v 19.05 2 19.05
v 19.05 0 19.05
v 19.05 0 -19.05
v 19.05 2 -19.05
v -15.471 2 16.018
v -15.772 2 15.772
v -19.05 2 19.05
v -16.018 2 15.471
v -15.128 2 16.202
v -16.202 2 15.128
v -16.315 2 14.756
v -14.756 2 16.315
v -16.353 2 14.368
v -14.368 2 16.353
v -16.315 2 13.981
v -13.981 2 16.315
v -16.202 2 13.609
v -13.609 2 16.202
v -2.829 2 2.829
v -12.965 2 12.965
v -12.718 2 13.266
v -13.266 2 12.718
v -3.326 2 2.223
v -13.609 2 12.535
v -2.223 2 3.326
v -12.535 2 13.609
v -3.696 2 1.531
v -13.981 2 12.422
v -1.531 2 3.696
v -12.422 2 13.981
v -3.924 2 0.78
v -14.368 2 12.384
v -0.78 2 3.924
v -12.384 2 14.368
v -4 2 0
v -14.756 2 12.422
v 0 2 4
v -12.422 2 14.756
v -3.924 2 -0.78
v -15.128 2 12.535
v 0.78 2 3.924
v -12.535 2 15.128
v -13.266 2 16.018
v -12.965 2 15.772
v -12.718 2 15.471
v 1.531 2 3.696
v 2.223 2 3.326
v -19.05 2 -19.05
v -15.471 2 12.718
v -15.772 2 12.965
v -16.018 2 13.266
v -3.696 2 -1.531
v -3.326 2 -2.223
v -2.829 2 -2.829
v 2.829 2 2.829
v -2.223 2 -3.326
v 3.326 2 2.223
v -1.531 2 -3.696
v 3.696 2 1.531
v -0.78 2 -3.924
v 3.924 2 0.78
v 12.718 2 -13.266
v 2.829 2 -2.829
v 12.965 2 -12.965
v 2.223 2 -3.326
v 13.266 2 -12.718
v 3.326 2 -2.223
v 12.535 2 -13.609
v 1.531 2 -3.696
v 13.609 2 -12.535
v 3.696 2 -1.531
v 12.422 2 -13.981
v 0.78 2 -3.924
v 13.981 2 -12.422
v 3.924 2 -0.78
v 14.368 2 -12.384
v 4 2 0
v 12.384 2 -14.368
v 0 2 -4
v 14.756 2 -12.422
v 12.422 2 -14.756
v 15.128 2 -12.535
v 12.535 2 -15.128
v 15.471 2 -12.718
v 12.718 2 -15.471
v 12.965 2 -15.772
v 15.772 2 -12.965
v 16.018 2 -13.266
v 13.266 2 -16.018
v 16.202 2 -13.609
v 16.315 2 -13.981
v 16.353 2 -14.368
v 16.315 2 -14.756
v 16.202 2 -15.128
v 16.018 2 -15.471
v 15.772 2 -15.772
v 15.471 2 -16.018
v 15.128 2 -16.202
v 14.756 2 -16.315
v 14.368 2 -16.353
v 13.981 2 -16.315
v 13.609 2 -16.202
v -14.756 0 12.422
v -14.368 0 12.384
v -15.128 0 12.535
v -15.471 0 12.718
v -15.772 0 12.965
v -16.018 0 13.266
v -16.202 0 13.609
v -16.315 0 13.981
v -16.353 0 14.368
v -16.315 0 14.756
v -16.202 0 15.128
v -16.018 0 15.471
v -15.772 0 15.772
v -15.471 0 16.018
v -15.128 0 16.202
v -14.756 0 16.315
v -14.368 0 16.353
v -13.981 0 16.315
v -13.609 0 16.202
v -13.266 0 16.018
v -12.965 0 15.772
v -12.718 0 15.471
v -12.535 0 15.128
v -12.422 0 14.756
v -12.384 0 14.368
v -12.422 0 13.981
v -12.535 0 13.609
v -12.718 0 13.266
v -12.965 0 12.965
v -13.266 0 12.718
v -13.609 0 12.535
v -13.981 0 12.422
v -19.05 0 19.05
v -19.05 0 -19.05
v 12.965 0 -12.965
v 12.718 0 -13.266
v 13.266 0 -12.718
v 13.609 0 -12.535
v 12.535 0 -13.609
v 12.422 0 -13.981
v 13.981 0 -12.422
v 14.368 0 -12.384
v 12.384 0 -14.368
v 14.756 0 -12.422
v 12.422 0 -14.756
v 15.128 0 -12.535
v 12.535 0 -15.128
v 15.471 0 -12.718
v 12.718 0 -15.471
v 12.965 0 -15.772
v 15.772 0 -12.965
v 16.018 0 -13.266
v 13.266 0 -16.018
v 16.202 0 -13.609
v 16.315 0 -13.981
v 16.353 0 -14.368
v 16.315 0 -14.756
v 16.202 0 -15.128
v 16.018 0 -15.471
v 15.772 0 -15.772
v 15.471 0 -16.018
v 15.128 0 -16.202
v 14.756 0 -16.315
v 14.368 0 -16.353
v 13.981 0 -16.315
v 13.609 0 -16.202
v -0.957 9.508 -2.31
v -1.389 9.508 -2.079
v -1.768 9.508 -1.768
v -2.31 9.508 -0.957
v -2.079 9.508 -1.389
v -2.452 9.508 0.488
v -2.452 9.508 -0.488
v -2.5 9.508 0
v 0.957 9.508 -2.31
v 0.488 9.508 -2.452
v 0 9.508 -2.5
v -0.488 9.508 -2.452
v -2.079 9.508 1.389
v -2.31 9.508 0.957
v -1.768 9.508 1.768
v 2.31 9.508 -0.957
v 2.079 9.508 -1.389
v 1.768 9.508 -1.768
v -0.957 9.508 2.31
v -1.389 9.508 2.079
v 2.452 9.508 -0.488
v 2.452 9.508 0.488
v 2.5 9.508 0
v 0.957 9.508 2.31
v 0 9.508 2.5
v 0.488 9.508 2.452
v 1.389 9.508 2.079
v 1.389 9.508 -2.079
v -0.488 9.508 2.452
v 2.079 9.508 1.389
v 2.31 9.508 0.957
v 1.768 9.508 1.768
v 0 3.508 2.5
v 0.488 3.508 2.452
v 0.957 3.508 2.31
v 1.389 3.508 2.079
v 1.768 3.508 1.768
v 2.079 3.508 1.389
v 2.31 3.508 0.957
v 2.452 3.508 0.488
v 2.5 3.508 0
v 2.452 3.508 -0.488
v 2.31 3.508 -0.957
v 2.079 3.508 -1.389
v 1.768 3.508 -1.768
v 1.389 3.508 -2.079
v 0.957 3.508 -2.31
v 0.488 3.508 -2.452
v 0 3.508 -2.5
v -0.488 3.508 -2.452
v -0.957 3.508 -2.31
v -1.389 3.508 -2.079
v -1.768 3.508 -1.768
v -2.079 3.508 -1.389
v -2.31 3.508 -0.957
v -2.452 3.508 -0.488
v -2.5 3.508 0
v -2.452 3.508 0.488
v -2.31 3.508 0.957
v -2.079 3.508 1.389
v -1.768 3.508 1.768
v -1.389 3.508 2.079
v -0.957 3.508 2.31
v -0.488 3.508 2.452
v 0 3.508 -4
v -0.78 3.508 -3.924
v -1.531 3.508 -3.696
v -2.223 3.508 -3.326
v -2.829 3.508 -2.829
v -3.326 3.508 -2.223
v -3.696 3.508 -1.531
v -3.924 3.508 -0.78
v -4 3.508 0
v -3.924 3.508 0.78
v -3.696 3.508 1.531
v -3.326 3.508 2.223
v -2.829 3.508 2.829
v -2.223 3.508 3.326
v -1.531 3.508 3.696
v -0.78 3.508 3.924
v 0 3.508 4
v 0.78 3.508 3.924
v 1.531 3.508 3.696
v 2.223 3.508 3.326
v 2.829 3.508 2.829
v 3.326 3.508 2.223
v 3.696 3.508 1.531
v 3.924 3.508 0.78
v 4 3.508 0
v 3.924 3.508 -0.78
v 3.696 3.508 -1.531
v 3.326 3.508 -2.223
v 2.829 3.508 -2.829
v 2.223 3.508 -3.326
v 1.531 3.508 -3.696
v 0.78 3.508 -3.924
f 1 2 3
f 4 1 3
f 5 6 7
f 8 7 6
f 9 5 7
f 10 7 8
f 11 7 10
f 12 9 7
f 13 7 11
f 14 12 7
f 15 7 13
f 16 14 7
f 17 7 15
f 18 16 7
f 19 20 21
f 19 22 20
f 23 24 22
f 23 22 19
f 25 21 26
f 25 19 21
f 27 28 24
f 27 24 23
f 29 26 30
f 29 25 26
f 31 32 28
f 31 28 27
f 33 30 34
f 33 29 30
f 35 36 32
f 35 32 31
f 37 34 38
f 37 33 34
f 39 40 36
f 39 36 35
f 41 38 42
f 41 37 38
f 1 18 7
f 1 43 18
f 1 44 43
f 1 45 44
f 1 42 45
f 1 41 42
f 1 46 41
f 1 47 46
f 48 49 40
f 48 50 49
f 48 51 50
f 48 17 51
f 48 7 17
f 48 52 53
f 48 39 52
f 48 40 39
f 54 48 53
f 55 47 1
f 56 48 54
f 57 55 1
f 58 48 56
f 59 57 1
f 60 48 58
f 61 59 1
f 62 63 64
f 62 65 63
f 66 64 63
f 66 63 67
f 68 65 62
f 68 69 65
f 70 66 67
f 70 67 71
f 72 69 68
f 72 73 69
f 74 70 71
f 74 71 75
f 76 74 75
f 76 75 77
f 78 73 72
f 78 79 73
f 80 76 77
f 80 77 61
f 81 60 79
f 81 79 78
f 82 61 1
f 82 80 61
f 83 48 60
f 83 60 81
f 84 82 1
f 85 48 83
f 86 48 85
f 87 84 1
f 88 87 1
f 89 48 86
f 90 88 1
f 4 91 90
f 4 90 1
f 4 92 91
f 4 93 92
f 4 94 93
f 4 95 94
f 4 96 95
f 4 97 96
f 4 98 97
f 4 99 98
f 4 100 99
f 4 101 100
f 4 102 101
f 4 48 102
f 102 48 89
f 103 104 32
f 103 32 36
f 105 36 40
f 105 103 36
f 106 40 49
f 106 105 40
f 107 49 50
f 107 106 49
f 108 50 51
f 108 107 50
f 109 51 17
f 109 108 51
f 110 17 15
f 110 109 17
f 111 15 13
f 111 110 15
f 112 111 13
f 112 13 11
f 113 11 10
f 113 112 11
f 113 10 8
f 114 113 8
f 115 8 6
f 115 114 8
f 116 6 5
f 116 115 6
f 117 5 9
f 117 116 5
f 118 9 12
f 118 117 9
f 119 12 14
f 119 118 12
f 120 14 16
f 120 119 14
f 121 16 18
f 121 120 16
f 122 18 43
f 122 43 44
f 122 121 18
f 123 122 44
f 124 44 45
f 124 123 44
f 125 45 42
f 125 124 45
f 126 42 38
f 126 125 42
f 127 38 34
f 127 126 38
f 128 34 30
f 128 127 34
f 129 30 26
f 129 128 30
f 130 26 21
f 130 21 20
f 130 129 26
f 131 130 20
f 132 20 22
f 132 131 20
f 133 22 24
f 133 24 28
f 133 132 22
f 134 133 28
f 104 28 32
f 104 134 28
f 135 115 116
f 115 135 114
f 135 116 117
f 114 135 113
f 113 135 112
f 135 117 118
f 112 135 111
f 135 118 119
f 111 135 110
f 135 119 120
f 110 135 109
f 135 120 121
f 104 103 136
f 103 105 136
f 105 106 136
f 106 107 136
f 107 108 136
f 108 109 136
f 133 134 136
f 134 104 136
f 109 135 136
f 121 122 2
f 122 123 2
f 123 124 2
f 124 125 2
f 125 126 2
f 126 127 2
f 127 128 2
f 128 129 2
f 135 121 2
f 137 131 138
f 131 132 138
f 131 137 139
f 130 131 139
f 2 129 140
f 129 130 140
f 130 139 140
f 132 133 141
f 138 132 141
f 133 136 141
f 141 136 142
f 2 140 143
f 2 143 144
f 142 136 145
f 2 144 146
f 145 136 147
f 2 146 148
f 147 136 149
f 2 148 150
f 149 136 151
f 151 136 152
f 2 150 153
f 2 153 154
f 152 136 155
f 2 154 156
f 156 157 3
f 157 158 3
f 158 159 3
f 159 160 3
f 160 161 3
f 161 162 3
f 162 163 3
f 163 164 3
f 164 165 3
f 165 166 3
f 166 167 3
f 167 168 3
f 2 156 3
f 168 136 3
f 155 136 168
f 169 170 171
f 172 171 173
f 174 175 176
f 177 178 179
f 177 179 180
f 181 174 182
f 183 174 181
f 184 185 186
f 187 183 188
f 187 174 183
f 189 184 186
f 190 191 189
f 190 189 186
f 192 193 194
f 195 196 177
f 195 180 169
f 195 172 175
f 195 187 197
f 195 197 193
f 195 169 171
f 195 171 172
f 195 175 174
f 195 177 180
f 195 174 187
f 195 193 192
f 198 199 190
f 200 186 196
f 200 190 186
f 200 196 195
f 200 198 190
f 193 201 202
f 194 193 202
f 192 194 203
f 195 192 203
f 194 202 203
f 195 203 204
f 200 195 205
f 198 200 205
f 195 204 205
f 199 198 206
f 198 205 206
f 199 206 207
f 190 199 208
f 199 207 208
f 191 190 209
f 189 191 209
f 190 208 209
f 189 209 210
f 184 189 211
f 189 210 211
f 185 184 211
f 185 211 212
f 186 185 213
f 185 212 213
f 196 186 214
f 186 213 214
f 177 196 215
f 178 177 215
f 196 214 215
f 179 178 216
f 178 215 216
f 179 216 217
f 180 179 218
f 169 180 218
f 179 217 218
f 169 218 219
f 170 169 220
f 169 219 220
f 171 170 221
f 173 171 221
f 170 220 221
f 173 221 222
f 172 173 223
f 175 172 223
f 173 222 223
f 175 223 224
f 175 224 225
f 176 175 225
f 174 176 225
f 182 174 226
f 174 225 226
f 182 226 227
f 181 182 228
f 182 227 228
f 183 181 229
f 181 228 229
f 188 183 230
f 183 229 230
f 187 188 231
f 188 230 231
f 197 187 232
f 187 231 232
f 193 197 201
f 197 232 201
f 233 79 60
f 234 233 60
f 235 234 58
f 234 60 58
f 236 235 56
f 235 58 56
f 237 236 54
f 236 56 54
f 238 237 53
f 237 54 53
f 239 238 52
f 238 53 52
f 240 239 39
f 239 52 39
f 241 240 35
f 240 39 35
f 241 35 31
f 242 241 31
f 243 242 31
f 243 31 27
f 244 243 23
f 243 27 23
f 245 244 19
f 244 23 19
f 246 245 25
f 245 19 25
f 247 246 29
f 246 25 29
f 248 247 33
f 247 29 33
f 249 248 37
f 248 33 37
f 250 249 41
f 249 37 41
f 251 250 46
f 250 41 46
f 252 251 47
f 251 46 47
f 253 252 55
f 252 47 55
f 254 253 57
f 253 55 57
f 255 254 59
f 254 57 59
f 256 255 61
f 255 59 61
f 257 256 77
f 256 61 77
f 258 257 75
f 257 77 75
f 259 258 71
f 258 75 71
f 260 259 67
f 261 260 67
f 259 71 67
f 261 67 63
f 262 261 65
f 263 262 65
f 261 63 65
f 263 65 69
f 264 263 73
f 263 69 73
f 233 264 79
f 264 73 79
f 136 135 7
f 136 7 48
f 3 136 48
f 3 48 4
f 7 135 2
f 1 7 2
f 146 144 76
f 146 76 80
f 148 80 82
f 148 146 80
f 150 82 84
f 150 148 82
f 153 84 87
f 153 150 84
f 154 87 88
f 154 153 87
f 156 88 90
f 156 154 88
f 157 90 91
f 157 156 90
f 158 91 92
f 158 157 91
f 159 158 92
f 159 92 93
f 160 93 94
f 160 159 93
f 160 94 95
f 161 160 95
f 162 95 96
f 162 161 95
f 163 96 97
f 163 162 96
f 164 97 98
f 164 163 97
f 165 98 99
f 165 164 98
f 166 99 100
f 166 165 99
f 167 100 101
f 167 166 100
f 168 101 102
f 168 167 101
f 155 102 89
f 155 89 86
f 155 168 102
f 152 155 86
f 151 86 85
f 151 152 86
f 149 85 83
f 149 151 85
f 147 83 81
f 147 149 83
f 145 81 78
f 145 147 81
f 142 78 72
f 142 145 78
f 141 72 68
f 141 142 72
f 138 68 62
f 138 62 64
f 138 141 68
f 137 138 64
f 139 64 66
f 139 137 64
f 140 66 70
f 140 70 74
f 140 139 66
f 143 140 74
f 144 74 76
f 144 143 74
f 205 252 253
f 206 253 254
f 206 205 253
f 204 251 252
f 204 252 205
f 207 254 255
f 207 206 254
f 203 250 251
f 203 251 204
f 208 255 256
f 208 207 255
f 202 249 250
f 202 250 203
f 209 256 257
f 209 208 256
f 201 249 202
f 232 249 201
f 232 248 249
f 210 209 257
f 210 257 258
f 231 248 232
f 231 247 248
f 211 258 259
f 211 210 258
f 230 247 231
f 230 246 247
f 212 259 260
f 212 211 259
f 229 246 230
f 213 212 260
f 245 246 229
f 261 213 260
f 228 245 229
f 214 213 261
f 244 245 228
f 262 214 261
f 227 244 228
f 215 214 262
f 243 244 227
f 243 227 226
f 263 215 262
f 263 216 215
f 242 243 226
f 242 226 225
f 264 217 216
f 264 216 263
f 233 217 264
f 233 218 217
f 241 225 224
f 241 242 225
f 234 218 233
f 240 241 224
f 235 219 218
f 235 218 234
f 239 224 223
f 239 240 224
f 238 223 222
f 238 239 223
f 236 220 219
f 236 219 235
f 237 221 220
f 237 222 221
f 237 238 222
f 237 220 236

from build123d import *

# Parameters (mm, degrees)
SKETCH1_W           = 38.1
SKETCH1_H           = 38.1
SKETCH1_R           = 1.984375
BOSS_EXTRUDE1_DEPTH = 2
SKETCH2_R           = 4.0005
BOSS_EXTRUDE2_DEPTH = 1.508000032
SKETCH3_R           = 2.5
BOSS_EXTRUDE3_DEPTH = 6


with BuildPart() as part:
    # Sketch1 → Boss-Extrude1 (new body)
    with BuildSketch(Plane(origin=(0, 0, 0), x_dir=(1, 0, 0), z_dir=(0, 1, 0))):
        Rectangle(SKETCH1_W, SKETCH1_H)
        with Locations(Location((14.368409794, 14.368409794, 0), (0, 0, 270))):
            Circle(SKETCH1_R, mode=Mode.SUBTRACT)
        with Locations(Location((-14.368409794, -14.368409794, 0), (0, 0, 90))):
            Circle(SKETCH1_R, mode=Mode.SUBTRACT)
    extrude(amount=BOSS_EXTRUDE1_DEPTH)

    # Sketch2 → Boss-Extrude2 (add)
    with BuildSketch(Plane(origin=(0, 2, 0), x_dir=(1, 0, 0), z_dir=(0, 1, 0))):
        with Locations(Location((0, 0, 0), (0, 0, 90))):
            Circle(SKETCH2_R)
    extrude(amount=BOSS_EXTRUDE2_DEPTH)

    # Sketch3 → Boss-Extrude3 (add)
    with BuildSketch(Plane(origin=(0, 3.508000032, 0), x_dir=(1, 0, 0), z_dir=(0, 1, 0))):
        with Locations(Location((0, 0, 0), (0, 0, 270))):
            Circle(SKETCH3_R)
    extrude(amount=BOSS_EXTRUDE3_DEPTH)


solid = part.part
